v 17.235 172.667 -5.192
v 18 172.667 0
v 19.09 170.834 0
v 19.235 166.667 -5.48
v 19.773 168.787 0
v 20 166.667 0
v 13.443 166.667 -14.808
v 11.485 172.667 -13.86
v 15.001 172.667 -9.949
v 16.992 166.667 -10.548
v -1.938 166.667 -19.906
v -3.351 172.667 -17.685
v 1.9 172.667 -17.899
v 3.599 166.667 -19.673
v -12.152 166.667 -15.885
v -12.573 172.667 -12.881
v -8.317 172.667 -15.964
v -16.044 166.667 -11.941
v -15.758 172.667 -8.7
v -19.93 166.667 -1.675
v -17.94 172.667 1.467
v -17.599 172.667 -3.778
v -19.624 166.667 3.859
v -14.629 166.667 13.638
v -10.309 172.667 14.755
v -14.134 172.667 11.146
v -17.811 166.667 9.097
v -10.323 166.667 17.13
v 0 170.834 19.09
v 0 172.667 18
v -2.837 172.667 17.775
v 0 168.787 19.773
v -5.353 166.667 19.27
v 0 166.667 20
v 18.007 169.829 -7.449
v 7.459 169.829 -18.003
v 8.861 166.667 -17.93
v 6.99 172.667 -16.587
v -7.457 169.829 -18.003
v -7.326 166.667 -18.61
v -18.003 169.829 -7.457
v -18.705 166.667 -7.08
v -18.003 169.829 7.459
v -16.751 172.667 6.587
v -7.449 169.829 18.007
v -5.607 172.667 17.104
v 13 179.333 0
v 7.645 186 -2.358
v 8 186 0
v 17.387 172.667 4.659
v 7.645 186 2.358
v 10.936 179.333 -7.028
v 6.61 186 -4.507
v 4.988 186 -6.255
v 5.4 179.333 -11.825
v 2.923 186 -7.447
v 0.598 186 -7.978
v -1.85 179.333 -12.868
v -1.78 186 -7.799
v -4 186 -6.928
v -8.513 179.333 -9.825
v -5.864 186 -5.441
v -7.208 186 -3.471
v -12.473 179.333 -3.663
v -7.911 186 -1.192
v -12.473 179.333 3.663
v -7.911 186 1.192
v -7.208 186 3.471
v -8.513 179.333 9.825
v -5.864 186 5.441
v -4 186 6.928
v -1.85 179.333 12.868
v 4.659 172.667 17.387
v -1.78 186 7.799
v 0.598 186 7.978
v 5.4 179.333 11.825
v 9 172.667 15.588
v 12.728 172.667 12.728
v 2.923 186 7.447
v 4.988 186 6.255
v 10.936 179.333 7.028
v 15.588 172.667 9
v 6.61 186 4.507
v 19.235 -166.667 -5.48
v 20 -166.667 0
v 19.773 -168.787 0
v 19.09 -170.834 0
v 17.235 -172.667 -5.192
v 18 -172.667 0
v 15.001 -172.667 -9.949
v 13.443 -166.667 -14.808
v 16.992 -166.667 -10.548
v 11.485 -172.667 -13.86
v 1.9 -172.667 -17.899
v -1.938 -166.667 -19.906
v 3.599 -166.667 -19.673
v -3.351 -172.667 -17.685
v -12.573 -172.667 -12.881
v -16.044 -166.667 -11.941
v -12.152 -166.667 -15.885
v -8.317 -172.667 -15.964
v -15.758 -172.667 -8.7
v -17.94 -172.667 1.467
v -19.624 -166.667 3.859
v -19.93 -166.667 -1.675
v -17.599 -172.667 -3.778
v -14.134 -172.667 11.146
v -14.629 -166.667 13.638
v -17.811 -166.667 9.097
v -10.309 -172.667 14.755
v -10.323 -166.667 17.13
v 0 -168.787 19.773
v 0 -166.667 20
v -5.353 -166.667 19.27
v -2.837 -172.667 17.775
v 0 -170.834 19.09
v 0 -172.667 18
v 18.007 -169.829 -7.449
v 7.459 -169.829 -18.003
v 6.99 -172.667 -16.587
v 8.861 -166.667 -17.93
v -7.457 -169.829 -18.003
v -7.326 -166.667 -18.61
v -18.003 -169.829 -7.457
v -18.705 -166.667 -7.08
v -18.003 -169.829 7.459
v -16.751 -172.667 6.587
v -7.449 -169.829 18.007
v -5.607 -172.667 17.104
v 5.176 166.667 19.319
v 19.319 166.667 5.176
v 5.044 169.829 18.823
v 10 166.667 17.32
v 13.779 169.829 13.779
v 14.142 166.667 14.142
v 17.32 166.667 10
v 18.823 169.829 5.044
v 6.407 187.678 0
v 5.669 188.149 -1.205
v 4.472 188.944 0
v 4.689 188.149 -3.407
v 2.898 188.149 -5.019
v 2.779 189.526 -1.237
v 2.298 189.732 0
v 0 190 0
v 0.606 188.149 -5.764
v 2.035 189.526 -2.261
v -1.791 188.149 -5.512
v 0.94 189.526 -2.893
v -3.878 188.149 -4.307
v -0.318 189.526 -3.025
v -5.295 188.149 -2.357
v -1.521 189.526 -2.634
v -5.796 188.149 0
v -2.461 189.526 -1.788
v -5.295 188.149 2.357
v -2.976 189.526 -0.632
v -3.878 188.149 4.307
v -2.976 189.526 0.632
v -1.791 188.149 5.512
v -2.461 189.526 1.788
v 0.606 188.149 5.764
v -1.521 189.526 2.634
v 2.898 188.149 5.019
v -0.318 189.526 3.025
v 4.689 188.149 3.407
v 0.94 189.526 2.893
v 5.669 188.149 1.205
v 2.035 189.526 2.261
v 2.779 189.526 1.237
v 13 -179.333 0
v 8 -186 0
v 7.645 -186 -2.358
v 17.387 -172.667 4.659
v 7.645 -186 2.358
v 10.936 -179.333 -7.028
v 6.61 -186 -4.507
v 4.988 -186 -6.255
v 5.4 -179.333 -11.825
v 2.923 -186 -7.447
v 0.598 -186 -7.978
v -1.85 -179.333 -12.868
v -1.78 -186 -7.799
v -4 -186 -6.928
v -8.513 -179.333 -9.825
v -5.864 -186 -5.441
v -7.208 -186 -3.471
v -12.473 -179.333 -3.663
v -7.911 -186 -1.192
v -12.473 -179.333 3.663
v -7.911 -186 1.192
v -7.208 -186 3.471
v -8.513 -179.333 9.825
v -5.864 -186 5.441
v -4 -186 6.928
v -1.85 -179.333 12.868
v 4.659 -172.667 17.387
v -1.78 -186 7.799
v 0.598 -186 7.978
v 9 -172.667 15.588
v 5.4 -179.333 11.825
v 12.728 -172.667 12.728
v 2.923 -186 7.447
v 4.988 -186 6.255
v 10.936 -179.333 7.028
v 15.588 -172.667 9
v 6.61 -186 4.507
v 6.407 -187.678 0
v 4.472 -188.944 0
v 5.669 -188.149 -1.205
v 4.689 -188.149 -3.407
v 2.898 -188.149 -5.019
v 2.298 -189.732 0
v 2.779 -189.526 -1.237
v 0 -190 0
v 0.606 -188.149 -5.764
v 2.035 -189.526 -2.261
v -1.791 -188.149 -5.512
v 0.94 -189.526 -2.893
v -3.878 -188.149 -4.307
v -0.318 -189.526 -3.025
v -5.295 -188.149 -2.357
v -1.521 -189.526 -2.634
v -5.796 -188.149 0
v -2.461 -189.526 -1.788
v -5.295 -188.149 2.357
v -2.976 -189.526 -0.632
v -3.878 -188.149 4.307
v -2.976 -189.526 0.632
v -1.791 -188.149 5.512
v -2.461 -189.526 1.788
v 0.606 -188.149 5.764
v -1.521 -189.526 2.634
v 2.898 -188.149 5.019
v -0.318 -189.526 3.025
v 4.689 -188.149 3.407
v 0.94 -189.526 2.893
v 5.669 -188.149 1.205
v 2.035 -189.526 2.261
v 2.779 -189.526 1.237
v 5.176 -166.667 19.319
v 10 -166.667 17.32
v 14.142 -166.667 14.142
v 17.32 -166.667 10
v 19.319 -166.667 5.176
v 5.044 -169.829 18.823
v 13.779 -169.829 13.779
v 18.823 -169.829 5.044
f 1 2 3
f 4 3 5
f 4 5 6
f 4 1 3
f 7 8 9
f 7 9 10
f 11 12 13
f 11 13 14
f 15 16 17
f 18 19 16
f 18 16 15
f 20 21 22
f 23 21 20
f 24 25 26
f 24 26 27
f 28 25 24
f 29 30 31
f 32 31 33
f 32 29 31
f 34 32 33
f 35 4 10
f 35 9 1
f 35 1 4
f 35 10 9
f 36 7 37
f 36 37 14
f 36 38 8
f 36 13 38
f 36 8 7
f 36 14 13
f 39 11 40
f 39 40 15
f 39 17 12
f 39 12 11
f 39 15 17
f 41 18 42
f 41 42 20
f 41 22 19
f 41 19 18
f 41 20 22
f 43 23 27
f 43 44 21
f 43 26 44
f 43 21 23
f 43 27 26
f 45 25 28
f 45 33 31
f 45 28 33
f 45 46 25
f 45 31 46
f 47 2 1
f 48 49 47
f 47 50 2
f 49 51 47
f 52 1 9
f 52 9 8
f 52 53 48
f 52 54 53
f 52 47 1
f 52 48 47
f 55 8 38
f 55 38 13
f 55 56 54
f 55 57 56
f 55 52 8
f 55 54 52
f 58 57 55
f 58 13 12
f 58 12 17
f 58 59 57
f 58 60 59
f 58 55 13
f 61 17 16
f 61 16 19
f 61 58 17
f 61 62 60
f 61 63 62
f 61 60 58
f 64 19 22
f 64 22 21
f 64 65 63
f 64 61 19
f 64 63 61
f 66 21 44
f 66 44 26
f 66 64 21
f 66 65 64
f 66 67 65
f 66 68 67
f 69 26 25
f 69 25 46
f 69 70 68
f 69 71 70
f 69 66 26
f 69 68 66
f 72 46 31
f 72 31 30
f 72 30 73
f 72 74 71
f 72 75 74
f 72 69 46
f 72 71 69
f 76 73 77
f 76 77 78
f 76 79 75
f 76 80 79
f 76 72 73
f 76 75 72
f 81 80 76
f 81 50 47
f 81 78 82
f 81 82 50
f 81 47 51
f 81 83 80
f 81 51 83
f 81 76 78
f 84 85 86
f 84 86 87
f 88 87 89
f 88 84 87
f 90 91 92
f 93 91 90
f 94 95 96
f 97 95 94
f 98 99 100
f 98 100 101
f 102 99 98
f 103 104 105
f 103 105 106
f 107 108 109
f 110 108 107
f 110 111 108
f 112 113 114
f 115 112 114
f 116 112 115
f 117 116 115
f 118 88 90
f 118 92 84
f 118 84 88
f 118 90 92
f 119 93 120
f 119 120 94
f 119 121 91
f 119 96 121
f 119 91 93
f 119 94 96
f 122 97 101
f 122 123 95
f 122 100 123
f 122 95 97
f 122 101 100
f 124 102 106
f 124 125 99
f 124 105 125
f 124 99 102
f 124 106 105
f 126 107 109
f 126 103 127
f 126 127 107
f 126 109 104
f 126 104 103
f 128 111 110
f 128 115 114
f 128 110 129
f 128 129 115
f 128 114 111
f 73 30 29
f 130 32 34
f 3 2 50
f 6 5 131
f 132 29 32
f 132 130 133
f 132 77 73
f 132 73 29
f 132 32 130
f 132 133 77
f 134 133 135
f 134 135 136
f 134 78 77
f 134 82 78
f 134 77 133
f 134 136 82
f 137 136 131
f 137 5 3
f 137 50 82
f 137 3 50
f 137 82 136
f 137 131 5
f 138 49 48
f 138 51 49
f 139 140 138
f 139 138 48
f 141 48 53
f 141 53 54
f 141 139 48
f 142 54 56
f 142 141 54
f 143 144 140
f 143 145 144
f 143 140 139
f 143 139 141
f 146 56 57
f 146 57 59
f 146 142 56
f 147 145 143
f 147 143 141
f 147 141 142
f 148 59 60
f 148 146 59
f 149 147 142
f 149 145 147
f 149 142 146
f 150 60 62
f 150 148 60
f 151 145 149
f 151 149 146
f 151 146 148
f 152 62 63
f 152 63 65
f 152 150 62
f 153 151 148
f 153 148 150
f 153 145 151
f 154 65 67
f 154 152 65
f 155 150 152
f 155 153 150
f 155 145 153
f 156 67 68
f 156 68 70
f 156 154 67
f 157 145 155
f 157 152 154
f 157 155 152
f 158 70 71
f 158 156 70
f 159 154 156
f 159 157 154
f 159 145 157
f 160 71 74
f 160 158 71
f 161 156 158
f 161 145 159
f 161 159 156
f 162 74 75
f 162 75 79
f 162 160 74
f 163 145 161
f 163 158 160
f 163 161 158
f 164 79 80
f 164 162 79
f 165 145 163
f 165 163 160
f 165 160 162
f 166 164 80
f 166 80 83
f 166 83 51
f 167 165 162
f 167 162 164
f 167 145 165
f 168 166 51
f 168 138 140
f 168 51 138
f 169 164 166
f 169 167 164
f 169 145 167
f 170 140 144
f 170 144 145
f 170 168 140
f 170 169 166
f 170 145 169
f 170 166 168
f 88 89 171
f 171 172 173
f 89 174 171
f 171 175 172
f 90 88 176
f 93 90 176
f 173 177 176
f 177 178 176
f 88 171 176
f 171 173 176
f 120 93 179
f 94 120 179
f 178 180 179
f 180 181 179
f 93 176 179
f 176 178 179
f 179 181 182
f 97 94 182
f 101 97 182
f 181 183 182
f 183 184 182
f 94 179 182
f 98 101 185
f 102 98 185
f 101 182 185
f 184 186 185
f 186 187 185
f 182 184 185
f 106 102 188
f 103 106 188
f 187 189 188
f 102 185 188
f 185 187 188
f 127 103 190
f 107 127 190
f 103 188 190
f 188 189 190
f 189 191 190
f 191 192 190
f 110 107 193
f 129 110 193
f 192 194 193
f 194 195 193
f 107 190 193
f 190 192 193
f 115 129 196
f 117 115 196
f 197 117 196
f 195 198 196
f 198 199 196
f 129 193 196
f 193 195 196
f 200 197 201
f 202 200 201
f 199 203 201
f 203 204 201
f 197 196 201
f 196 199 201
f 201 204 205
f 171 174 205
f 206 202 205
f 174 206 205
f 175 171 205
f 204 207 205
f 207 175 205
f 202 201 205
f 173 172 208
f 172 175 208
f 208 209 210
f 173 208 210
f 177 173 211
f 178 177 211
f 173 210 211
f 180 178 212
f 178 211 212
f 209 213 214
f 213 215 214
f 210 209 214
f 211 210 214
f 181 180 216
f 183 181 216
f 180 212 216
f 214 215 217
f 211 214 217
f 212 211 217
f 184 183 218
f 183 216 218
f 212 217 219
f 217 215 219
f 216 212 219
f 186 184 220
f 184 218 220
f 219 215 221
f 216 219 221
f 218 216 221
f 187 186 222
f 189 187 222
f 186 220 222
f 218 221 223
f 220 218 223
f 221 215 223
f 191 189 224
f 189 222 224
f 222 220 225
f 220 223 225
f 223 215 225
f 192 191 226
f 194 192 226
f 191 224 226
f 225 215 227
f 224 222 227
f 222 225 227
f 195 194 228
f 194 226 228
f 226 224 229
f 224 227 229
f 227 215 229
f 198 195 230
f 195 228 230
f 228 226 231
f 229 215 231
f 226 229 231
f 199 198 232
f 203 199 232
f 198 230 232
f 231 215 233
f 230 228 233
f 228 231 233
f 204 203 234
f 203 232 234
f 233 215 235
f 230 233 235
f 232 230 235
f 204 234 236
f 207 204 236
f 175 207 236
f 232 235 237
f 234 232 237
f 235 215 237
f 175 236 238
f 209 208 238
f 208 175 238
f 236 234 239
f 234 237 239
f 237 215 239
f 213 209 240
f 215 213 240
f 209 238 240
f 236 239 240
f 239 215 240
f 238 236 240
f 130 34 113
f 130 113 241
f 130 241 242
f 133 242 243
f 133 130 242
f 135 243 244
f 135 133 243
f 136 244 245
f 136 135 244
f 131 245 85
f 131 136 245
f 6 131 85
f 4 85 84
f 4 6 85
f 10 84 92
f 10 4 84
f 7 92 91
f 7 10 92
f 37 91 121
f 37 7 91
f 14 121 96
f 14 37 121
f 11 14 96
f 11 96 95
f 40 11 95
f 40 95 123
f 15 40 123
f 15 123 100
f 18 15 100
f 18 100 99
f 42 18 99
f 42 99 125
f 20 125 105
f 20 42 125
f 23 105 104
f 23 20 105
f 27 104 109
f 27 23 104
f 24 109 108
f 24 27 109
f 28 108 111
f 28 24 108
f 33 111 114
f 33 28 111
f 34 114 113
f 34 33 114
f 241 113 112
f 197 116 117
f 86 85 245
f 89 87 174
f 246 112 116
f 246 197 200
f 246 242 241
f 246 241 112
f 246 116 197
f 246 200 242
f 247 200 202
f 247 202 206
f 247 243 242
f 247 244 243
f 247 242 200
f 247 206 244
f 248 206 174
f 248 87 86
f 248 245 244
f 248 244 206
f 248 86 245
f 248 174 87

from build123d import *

# Parameters (mm, degrees)
SKETCH1_R           = 20
BOSS_EXTRUDE1_DEPTH = 170
FILLET1_R           = 10


with BuildPart() as part:
    # Sketch1 → Boss-Extrude1 (new, symmetric)
    with BuildSketch(Plane(origin=(0, 0, 0), x_dir=(-1, 0, 0), z_dir=(0, 1, 0))):
        with Locations(Location((0, 0, 0), (0, 0, 90))):
            Circle(SKETCH1_R)
    extrude(amount=BOSS_EXTRUDE1_DEPTH, both=True)

    # Sketch2 → Revolve1 (revolve)
    with BuildSketch(Plane(origin=(0, 0, 0), x_dir=(0, 1, 0), z_dir=(0, 0, 1)), mode=Mode.PRIVATE) as revolve1_sk:
        with BuildLine():
            Line((-170, 20), (-186, 8))
            ThreePointArc((-186, 8), (-188.94427191, 4.472135955), (-190, 0))
            Line((-190, 0), (-180, 0))
            Line((-180, 0), (-170, 0))
            Line((-170, 0), (-170, 20))
        make_face()
    revolve1 = revolve(revolve1_sk.sketch.rotate(Axis((0, -190, 0), (0, 1, 0)), 180), axis=Axis((0, -190, 0), (0, 1, 0)))

    # Mirror2: Revolve1 across plane
    add(revolve1.mirror(Plane.ZX))

    # Fillet1
    fillet1_edges = [part.edges().sort_by_distance(p)[0] for p in [
        (14.142135624, 170, 14.142135624),
        (-14.142135624, -170, -14.142135624),
    ]]
    fillet(fillet1_edges, radius=FILLET1_R)


solid = part.part
